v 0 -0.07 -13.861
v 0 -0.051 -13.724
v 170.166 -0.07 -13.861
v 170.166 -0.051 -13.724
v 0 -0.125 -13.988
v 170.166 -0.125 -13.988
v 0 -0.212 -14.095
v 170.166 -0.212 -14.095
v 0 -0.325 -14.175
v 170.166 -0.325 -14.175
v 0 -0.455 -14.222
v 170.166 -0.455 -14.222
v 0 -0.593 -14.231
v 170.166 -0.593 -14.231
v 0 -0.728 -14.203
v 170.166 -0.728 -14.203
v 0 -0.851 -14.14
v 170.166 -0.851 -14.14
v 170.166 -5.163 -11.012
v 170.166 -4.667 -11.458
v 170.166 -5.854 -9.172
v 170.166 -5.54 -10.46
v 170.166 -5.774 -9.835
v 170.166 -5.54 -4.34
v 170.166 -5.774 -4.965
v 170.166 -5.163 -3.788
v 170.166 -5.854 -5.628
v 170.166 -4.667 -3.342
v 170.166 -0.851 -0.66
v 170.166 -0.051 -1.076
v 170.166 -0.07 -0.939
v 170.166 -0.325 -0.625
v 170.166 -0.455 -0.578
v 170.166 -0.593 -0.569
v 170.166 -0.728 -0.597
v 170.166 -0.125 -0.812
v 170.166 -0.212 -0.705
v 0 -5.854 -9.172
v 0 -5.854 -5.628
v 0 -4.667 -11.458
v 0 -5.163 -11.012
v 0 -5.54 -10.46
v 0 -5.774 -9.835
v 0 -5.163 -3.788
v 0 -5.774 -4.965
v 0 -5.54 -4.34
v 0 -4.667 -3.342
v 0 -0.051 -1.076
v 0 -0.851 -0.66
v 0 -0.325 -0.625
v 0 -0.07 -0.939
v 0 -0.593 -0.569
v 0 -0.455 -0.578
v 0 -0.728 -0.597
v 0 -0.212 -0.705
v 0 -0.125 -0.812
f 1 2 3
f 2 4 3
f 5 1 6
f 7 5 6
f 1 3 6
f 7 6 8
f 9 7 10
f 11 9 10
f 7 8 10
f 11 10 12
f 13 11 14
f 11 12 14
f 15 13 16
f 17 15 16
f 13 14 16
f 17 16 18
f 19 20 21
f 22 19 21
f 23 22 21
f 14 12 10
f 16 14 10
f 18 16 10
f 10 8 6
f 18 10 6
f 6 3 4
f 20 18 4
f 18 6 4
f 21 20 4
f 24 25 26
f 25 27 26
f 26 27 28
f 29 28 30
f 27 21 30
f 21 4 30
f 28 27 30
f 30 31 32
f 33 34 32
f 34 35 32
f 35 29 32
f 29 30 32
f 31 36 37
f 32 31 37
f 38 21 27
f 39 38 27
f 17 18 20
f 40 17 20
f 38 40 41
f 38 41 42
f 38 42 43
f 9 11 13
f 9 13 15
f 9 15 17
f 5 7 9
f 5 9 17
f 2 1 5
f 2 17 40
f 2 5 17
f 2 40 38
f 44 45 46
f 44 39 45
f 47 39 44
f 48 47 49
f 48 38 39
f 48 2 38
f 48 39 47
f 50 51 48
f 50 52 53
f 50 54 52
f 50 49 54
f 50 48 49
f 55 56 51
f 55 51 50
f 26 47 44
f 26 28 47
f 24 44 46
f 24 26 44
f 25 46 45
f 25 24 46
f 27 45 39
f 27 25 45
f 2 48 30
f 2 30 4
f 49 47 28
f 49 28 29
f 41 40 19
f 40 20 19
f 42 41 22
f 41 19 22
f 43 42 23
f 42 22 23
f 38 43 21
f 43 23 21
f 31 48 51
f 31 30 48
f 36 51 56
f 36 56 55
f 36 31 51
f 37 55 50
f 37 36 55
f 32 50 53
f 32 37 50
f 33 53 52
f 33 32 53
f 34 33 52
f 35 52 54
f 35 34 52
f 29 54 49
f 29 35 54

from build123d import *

# Parameters (mm, degrees)
BOSS_EXTRUDE1_DEPTH = 170.165700006
FILLET1_R           = 0.508
FILLET2_R           = 2.794


with BuildPart() as part:
    # Sketch1 → Boss-Extrude1 (new body)
    with BuildSketch(Plane(origin=(0, 0, 0), x_dir=(0, 0, -1), z_dir=(1, 0, 0))):
        Polygon((0.09779276, -0.0508), (14.70220724, -0.0508), (10.623611135, -5.8542), (4.176388865, -5.8542), align=None)
    extrude(amount=BOSS_EXTRUDE1_DEPTH)

    # Fillet1
    fillet1_edges = [part.edges().sort_by_distance(p)[0] for p in [
        (85.082850003, -0.0508, -0.09779276),
        (85.082850003, -0.0508, -14.70220724),
    ]]
    fillet(fillet1_edges, radius=FILLET1_R)

    # Fillet2
    fillet2_edges = [part.edges().sort_by_distance(p)[0] for p in [
        (85.082850003, -5.8542, -10.623611135),
        (85.082850003, -5.8542, -4.176388865),
    ]]
    fillet(fillet2_edges, radius=FILLET2_R)


solid = part.part
